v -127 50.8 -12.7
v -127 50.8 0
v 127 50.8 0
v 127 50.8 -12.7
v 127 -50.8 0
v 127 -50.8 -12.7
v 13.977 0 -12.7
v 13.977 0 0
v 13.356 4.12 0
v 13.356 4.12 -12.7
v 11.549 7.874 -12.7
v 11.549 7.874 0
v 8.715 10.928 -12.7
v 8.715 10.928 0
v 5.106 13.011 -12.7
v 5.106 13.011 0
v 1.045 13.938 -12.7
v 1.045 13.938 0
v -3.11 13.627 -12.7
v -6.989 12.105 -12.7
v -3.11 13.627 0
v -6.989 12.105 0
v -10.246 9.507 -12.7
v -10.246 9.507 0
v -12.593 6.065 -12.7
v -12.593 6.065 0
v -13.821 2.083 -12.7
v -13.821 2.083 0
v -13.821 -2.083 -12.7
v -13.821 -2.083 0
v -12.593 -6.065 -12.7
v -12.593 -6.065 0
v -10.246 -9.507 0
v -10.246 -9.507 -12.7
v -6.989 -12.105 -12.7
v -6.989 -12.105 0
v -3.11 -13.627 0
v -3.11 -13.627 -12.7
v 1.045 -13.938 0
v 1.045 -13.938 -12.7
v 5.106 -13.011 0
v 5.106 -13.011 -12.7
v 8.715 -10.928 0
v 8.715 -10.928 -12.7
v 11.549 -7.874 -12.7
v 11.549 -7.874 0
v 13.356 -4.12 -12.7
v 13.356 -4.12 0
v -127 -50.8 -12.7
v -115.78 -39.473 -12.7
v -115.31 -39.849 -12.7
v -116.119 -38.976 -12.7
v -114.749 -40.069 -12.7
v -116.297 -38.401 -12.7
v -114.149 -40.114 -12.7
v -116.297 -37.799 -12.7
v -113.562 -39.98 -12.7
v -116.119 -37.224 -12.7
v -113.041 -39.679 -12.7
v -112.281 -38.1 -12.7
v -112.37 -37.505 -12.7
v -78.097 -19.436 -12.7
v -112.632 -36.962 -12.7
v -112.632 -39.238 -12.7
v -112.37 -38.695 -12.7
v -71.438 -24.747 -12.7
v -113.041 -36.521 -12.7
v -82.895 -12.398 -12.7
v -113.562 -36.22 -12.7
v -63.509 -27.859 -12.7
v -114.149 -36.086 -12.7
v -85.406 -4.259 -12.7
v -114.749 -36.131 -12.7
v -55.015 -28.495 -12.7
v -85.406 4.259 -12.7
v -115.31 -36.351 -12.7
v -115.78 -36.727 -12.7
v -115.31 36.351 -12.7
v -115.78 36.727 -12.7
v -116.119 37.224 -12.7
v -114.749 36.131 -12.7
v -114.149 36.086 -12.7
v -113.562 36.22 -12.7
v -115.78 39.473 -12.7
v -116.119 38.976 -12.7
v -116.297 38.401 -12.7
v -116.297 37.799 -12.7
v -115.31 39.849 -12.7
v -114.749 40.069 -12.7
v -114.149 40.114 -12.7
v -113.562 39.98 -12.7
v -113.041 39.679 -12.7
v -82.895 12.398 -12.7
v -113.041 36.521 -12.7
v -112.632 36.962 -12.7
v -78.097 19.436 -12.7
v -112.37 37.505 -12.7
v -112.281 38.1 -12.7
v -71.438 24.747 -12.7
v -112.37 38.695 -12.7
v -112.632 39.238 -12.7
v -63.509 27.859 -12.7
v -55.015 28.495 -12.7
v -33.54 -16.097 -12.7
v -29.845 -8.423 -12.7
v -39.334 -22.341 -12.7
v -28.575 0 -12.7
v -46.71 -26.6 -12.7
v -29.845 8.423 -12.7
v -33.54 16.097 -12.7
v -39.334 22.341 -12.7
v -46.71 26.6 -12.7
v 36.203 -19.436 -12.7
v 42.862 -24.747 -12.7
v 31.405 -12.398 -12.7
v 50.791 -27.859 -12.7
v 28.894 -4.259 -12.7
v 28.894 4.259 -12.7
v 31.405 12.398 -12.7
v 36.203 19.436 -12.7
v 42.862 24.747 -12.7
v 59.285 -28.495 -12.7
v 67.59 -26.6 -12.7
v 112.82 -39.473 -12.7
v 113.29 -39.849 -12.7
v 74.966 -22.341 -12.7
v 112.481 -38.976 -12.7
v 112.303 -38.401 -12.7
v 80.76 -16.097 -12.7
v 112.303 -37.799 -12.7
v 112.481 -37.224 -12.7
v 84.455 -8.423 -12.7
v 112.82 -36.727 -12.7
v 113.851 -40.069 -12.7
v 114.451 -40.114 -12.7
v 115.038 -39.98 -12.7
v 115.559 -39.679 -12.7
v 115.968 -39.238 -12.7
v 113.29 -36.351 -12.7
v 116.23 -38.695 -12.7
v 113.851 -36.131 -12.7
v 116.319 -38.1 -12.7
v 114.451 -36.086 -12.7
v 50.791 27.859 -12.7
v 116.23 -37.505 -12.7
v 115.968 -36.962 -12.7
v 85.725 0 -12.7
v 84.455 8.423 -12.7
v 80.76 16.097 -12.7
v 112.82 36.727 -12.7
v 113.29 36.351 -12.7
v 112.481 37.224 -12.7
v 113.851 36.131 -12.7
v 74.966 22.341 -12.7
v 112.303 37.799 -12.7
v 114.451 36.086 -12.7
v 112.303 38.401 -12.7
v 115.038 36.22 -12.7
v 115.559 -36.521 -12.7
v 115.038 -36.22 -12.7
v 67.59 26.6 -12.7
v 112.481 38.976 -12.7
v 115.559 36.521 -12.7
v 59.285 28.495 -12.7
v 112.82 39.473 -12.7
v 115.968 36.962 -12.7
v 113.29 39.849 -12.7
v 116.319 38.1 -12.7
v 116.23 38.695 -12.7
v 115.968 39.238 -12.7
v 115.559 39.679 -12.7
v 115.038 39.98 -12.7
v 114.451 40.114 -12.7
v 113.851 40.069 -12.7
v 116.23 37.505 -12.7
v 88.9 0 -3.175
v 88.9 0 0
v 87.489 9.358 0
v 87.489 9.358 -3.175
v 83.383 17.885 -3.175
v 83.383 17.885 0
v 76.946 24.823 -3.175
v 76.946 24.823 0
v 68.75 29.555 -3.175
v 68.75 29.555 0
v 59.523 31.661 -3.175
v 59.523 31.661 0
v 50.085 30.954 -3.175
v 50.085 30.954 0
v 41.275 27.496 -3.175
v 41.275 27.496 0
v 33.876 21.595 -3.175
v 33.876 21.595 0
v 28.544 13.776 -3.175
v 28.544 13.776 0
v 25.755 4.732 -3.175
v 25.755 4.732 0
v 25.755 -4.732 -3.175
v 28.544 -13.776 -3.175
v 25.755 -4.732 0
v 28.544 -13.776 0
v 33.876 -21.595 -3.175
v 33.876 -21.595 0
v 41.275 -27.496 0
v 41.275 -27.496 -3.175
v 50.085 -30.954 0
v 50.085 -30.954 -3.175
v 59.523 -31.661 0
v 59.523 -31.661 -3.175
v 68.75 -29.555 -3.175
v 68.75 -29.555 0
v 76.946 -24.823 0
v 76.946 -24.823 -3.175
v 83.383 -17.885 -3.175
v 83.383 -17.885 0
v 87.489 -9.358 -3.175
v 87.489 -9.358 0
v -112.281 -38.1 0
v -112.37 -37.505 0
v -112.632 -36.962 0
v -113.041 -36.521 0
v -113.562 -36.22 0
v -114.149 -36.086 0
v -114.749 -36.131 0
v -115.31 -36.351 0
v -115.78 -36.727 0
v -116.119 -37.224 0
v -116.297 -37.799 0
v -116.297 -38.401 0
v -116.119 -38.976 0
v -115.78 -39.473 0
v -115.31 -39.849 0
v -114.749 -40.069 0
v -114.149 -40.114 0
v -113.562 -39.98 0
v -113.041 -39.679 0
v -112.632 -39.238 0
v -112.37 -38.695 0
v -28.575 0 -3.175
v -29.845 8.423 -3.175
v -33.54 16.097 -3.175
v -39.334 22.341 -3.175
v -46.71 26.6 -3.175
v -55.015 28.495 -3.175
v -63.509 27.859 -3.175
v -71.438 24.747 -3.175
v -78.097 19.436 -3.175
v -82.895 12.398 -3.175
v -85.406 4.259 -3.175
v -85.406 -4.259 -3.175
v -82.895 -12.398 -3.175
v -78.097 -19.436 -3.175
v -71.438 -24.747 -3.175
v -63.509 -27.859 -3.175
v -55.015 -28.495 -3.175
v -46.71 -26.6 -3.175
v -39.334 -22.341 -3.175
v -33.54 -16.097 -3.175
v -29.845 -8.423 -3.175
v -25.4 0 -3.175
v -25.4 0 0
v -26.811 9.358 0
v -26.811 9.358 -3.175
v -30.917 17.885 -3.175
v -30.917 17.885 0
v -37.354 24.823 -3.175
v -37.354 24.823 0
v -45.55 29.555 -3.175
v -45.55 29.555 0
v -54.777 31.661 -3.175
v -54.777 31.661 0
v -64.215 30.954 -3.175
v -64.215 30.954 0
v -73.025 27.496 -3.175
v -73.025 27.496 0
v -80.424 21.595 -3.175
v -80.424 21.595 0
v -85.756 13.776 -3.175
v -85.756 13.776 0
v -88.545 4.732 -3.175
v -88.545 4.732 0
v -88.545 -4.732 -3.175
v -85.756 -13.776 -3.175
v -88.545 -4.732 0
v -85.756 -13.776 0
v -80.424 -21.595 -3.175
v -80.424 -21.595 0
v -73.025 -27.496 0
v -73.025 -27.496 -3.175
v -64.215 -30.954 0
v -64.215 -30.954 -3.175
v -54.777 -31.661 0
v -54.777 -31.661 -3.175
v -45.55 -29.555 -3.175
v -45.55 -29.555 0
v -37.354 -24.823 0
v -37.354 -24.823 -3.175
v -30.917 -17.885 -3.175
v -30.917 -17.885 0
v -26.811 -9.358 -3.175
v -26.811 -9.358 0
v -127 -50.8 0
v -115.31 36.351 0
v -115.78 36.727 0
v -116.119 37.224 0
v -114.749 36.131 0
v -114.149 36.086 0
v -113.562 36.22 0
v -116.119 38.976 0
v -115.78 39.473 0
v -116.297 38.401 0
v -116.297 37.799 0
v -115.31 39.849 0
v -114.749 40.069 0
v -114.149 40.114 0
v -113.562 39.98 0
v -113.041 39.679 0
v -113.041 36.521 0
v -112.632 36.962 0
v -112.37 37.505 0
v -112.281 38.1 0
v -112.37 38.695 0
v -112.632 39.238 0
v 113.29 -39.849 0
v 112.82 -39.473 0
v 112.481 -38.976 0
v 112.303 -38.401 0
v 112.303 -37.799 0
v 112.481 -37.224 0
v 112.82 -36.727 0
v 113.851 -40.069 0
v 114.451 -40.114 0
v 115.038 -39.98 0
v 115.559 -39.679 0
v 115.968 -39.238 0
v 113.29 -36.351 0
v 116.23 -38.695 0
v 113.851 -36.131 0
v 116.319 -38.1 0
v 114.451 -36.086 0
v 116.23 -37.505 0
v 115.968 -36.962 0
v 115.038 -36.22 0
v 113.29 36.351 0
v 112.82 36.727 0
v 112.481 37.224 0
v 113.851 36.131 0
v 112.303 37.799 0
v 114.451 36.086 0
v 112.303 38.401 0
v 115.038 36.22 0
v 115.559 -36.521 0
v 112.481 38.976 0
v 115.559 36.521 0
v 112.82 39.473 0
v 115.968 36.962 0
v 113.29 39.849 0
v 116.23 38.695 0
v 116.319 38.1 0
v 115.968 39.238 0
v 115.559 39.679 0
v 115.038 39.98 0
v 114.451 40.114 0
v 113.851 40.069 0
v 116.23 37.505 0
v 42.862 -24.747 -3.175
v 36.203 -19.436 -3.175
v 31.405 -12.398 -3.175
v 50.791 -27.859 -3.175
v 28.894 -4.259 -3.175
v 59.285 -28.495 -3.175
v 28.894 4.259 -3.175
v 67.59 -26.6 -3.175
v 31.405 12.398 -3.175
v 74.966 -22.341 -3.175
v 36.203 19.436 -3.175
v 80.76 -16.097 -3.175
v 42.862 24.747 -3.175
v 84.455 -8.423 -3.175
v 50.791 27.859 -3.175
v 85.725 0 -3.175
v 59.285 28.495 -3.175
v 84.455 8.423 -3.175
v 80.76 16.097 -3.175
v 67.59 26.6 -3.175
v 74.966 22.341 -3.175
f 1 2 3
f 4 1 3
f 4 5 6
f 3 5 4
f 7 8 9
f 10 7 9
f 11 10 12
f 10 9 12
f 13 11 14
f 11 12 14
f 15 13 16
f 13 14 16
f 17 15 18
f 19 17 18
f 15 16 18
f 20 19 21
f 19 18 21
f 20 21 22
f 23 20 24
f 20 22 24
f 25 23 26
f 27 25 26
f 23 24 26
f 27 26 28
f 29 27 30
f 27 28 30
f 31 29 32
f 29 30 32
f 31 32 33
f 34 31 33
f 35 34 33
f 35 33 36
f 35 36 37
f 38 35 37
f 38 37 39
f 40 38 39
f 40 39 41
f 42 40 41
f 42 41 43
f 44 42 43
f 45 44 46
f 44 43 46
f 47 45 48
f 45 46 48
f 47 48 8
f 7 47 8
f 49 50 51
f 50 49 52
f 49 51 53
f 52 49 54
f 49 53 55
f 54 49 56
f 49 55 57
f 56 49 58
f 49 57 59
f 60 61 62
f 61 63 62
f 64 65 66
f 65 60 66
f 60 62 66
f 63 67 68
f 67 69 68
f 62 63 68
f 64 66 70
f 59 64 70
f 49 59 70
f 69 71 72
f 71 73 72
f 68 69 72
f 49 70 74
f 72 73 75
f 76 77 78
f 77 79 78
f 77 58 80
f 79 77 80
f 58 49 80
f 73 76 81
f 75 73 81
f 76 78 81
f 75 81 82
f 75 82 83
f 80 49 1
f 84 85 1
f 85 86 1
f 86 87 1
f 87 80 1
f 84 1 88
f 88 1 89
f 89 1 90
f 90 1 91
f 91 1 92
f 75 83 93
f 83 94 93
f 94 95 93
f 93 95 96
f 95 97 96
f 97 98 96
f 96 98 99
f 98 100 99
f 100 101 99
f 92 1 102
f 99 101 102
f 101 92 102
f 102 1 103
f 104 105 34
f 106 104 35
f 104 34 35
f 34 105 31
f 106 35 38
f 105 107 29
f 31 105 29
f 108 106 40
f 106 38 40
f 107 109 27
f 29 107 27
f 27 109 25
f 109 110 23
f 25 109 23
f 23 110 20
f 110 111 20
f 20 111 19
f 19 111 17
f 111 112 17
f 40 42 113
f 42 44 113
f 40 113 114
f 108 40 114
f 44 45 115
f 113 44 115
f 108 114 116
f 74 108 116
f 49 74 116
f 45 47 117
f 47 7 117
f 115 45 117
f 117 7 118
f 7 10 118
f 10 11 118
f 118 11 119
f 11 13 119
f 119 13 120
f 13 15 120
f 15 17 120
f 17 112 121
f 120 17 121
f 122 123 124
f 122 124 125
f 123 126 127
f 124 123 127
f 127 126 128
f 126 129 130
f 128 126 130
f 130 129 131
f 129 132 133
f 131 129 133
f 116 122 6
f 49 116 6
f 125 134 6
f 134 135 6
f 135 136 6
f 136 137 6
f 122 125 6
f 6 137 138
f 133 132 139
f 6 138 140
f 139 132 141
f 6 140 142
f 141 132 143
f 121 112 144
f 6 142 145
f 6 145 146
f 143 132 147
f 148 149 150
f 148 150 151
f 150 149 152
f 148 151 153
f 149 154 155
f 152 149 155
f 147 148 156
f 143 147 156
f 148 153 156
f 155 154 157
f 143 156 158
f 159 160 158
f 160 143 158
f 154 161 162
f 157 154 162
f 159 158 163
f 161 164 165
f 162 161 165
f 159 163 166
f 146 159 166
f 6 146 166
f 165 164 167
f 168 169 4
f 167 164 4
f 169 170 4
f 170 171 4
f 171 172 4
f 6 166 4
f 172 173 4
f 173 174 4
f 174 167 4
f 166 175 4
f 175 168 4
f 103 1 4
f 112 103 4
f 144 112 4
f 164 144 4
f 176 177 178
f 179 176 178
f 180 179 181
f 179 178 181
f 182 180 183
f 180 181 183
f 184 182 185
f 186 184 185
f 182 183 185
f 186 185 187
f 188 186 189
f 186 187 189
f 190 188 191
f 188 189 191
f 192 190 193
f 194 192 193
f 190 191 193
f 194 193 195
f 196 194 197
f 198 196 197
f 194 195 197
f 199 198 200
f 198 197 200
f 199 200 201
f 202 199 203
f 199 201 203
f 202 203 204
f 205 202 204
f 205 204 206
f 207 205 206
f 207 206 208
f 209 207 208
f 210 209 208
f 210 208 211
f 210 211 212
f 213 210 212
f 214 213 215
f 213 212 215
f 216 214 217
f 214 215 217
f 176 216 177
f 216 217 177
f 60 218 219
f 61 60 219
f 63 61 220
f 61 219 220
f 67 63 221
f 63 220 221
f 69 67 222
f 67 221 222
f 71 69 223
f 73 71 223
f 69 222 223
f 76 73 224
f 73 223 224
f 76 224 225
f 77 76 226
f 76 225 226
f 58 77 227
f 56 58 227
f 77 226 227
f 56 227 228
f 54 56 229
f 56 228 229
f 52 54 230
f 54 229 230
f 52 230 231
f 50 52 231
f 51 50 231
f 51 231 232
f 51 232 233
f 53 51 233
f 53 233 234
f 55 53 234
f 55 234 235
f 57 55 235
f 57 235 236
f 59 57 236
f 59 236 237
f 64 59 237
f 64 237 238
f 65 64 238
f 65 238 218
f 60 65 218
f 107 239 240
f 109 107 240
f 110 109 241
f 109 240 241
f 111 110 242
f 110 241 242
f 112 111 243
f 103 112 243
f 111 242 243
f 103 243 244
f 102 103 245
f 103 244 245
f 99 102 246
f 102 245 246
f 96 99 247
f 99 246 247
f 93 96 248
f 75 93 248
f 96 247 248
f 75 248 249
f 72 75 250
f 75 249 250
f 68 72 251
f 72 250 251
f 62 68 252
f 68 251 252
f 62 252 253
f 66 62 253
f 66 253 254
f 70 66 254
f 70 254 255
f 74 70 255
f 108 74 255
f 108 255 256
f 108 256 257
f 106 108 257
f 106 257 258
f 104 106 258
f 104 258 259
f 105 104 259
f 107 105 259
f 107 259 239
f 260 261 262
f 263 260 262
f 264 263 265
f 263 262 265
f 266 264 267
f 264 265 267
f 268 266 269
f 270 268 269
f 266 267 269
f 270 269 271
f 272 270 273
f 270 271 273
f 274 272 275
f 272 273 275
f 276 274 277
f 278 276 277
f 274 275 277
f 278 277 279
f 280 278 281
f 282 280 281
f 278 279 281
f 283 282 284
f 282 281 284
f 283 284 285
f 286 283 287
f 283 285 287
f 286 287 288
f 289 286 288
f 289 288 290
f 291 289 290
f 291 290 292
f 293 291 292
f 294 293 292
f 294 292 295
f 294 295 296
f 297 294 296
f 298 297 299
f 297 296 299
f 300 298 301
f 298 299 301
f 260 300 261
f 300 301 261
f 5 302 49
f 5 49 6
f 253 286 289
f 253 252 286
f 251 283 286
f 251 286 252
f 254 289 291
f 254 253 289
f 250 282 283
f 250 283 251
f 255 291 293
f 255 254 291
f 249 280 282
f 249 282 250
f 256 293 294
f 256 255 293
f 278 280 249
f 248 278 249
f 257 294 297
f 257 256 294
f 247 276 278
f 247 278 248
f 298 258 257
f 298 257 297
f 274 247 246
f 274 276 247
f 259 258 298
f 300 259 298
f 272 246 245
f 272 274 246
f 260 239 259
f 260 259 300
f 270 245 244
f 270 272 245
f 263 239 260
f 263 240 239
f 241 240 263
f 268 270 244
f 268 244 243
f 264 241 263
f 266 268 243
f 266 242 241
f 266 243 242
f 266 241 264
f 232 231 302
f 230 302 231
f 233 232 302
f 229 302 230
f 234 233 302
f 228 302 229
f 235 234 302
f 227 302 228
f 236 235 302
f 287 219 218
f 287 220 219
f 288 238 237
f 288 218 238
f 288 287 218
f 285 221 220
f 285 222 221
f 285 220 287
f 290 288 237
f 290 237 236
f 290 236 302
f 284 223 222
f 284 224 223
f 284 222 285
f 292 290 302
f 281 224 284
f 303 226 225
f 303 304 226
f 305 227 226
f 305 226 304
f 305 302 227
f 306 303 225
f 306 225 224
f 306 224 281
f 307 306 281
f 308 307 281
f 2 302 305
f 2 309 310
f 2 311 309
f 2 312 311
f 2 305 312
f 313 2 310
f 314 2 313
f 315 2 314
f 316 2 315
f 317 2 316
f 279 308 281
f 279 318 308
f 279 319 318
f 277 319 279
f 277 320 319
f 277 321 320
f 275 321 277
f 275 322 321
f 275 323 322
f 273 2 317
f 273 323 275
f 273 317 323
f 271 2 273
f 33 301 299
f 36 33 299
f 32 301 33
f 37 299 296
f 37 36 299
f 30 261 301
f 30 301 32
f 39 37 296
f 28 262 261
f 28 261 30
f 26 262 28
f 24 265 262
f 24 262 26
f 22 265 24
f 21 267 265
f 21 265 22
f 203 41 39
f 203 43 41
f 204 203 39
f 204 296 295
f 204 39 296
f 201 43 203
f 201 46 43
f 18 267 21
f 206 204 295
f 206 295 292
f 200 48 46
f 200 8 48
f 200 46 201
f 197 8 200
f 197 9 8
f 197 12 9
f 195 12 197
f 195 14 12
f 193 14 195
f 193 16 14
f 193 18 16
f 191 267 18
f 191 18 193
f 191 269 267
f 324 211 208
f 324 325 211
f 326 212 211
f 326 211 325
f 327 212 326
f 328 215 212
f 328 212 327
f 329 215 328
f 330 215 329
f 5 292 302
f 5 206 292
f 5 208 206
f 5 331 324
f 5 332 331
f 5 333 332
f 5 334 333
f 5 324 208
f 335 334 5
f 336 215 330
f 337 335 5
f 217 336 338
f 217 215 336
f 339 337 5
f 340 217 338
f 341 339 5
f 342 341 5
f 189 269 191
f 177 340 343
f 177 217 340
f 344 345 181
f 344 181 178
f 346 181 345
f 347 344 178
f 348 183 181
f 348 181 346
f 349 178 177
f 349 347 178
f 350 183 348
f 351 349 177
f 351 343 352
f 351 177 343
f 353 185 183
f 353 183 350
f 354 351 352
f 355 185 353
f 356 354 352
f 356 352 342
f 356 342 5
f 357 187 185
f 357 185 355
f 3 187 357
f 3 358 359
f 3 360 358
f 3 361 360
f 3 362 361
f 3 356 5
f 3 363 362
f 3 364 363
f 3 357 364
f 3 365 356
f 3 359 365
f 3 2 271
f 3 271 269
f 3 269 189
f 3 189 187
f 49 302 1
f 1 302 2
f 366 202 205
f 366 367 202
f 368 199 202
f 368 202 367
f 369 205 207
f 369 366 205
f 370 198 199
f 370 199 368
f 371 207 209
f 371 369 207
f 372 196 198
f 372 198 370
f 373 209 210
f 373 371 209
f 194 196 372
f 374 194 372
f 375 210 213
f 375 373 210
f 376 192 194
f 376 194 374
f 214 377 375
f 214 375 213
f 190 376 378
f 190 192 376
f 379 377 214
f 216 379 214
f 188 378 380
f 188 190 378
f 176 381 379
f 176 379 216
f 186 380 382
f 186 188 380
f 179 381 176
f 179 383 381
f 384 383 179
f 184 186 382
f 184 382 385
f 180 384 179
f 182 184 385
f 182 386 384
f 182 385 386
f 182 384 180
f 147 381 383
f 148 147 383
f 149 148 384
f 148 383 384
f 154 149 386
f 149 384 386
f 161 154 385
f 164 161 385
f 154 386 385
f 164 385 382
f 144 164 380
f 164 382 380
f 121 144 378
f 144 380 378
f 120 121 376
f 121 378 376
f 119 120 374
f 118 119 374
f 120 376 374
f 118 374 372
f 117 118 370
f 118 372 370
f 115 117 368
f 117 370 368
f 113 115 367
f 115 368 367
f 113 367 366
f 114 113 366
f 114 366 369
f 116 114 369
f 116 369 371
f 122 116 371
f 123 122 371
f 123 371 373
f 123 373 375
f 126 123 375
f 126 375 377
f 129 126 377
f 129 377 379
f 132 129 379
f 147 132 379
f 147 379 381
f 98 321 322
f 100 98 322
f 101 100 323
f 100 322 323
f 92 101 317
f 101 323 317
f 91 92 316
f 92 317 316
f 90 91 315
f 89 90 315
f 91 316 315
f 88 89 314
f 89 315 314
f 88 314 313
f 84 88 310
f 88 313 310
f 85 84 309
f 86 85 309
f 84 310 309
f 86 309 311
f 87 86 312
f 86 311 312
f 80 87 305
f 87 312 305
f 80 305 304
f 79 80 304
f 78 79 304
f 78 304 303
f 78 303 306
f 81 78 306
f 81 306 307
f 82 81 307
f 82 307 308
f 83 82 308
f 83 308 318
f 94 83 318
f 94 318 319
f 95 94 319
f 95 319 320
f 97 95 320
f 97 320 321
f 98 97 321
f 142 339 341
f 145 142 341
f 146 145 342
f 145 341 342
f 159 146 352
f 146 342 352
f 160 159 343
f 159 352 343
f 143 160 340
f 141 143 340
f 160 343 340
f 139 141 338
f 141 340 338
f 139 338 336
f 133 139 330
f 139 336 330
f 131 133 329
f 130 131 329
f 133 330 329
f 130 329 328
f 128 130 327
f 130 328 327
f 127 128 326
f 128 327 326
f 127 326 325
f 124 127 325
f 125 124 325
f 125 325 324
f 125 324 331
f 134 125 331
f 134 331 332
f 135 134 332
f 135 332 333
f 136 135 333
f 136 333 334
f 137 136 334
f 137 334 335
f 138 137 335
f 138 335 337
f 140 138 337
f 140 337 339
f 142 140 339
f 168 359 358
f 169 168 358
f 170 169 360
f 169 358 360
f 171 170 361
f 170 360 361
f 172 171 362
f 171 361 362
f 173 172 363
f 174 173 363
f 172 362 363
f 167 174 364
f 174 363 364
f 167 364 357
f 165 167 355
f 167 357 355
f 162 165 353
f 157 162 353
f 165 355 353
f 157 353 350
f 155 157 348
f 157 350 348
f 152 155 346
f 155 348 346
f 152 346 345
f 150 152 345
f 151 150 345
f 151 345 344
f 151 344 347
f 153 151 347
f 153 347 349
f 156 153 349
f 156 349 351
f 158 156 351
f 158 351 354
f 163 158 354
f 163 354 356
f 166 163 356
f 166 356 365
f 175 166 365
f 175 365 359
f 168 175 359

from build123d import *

# Parameters (mm, degrees)
SKETCH4_W          = 254
SKETCH4_H          = 101.6
BASE_EXTRUDE_DEPTH = 12.7
SKETCH5_R          = 28.575
SKETCH5_R_2        = 13.977315316
CUT_EXTRUDE1_DEPTH = 12.7
SKETCH6_R          = 31.75
CUT_EXTRUDE2_DEPTH = 3.175
SKETCH7_R          = 2.0193
CUT_EXTRUDE3_DEPTH = 25.4


with BuildPart() as part:
    # Sketch4 → Base-Extrude (new body)
    with BuildSketch(Plane.XY):
        Rectangle(SKETCH4_W, SKETCH4_H)
    extrude(amount=-BASE_EXTRUDE_DEPTH)

    # Sketch5 → Cut-Extrude1 (cut)
    with BuildSketch(Plane.XY):
        with Locations((-57.15, 0)):
            Circle(SKETCH5_R)
        with Locations((57.15, 0)):
            Circle(SKETCH5_R)
        Circle(SKETCH5_R_2)
    extrude(amount=-CUT_EXTRUDE1_DEPTH, mode=Mode.SUBTRACT)

    # Sketch6 → Cut-Extrude2 (cut)
    with BuildSketch(Plane.XY):
        with Locations((-57.15, 0)):
            Circle(SKETCH6_R)
        with Locations((57.15, 0)):
            Circle(SKETCH6_R)
    extrude(amount=-CUT_EXTRUDE2_DEPTH, mode=Mode.SUBTRACT)

    # Sketch7 → Cut-Extrude3 (cut)
    with BuildSketch(Plane.XY):
        with Locations((-114.3, -38.1)):
            Circle(SKETCH7_R)
        with Locations((-114.3, 38.1)):
            Circle(SKETCH7_R)
        with Locations((114.3, -38.1)):
            Circle(SKETCH7_R)
        with Locations((114.3, 38.1)):
            Circle(SKETCH7_R)
    extrude(amount=-CUT_EXTRUDE3_DEPTH, mode=Mode.SUBTRACT)


solid = part.part
